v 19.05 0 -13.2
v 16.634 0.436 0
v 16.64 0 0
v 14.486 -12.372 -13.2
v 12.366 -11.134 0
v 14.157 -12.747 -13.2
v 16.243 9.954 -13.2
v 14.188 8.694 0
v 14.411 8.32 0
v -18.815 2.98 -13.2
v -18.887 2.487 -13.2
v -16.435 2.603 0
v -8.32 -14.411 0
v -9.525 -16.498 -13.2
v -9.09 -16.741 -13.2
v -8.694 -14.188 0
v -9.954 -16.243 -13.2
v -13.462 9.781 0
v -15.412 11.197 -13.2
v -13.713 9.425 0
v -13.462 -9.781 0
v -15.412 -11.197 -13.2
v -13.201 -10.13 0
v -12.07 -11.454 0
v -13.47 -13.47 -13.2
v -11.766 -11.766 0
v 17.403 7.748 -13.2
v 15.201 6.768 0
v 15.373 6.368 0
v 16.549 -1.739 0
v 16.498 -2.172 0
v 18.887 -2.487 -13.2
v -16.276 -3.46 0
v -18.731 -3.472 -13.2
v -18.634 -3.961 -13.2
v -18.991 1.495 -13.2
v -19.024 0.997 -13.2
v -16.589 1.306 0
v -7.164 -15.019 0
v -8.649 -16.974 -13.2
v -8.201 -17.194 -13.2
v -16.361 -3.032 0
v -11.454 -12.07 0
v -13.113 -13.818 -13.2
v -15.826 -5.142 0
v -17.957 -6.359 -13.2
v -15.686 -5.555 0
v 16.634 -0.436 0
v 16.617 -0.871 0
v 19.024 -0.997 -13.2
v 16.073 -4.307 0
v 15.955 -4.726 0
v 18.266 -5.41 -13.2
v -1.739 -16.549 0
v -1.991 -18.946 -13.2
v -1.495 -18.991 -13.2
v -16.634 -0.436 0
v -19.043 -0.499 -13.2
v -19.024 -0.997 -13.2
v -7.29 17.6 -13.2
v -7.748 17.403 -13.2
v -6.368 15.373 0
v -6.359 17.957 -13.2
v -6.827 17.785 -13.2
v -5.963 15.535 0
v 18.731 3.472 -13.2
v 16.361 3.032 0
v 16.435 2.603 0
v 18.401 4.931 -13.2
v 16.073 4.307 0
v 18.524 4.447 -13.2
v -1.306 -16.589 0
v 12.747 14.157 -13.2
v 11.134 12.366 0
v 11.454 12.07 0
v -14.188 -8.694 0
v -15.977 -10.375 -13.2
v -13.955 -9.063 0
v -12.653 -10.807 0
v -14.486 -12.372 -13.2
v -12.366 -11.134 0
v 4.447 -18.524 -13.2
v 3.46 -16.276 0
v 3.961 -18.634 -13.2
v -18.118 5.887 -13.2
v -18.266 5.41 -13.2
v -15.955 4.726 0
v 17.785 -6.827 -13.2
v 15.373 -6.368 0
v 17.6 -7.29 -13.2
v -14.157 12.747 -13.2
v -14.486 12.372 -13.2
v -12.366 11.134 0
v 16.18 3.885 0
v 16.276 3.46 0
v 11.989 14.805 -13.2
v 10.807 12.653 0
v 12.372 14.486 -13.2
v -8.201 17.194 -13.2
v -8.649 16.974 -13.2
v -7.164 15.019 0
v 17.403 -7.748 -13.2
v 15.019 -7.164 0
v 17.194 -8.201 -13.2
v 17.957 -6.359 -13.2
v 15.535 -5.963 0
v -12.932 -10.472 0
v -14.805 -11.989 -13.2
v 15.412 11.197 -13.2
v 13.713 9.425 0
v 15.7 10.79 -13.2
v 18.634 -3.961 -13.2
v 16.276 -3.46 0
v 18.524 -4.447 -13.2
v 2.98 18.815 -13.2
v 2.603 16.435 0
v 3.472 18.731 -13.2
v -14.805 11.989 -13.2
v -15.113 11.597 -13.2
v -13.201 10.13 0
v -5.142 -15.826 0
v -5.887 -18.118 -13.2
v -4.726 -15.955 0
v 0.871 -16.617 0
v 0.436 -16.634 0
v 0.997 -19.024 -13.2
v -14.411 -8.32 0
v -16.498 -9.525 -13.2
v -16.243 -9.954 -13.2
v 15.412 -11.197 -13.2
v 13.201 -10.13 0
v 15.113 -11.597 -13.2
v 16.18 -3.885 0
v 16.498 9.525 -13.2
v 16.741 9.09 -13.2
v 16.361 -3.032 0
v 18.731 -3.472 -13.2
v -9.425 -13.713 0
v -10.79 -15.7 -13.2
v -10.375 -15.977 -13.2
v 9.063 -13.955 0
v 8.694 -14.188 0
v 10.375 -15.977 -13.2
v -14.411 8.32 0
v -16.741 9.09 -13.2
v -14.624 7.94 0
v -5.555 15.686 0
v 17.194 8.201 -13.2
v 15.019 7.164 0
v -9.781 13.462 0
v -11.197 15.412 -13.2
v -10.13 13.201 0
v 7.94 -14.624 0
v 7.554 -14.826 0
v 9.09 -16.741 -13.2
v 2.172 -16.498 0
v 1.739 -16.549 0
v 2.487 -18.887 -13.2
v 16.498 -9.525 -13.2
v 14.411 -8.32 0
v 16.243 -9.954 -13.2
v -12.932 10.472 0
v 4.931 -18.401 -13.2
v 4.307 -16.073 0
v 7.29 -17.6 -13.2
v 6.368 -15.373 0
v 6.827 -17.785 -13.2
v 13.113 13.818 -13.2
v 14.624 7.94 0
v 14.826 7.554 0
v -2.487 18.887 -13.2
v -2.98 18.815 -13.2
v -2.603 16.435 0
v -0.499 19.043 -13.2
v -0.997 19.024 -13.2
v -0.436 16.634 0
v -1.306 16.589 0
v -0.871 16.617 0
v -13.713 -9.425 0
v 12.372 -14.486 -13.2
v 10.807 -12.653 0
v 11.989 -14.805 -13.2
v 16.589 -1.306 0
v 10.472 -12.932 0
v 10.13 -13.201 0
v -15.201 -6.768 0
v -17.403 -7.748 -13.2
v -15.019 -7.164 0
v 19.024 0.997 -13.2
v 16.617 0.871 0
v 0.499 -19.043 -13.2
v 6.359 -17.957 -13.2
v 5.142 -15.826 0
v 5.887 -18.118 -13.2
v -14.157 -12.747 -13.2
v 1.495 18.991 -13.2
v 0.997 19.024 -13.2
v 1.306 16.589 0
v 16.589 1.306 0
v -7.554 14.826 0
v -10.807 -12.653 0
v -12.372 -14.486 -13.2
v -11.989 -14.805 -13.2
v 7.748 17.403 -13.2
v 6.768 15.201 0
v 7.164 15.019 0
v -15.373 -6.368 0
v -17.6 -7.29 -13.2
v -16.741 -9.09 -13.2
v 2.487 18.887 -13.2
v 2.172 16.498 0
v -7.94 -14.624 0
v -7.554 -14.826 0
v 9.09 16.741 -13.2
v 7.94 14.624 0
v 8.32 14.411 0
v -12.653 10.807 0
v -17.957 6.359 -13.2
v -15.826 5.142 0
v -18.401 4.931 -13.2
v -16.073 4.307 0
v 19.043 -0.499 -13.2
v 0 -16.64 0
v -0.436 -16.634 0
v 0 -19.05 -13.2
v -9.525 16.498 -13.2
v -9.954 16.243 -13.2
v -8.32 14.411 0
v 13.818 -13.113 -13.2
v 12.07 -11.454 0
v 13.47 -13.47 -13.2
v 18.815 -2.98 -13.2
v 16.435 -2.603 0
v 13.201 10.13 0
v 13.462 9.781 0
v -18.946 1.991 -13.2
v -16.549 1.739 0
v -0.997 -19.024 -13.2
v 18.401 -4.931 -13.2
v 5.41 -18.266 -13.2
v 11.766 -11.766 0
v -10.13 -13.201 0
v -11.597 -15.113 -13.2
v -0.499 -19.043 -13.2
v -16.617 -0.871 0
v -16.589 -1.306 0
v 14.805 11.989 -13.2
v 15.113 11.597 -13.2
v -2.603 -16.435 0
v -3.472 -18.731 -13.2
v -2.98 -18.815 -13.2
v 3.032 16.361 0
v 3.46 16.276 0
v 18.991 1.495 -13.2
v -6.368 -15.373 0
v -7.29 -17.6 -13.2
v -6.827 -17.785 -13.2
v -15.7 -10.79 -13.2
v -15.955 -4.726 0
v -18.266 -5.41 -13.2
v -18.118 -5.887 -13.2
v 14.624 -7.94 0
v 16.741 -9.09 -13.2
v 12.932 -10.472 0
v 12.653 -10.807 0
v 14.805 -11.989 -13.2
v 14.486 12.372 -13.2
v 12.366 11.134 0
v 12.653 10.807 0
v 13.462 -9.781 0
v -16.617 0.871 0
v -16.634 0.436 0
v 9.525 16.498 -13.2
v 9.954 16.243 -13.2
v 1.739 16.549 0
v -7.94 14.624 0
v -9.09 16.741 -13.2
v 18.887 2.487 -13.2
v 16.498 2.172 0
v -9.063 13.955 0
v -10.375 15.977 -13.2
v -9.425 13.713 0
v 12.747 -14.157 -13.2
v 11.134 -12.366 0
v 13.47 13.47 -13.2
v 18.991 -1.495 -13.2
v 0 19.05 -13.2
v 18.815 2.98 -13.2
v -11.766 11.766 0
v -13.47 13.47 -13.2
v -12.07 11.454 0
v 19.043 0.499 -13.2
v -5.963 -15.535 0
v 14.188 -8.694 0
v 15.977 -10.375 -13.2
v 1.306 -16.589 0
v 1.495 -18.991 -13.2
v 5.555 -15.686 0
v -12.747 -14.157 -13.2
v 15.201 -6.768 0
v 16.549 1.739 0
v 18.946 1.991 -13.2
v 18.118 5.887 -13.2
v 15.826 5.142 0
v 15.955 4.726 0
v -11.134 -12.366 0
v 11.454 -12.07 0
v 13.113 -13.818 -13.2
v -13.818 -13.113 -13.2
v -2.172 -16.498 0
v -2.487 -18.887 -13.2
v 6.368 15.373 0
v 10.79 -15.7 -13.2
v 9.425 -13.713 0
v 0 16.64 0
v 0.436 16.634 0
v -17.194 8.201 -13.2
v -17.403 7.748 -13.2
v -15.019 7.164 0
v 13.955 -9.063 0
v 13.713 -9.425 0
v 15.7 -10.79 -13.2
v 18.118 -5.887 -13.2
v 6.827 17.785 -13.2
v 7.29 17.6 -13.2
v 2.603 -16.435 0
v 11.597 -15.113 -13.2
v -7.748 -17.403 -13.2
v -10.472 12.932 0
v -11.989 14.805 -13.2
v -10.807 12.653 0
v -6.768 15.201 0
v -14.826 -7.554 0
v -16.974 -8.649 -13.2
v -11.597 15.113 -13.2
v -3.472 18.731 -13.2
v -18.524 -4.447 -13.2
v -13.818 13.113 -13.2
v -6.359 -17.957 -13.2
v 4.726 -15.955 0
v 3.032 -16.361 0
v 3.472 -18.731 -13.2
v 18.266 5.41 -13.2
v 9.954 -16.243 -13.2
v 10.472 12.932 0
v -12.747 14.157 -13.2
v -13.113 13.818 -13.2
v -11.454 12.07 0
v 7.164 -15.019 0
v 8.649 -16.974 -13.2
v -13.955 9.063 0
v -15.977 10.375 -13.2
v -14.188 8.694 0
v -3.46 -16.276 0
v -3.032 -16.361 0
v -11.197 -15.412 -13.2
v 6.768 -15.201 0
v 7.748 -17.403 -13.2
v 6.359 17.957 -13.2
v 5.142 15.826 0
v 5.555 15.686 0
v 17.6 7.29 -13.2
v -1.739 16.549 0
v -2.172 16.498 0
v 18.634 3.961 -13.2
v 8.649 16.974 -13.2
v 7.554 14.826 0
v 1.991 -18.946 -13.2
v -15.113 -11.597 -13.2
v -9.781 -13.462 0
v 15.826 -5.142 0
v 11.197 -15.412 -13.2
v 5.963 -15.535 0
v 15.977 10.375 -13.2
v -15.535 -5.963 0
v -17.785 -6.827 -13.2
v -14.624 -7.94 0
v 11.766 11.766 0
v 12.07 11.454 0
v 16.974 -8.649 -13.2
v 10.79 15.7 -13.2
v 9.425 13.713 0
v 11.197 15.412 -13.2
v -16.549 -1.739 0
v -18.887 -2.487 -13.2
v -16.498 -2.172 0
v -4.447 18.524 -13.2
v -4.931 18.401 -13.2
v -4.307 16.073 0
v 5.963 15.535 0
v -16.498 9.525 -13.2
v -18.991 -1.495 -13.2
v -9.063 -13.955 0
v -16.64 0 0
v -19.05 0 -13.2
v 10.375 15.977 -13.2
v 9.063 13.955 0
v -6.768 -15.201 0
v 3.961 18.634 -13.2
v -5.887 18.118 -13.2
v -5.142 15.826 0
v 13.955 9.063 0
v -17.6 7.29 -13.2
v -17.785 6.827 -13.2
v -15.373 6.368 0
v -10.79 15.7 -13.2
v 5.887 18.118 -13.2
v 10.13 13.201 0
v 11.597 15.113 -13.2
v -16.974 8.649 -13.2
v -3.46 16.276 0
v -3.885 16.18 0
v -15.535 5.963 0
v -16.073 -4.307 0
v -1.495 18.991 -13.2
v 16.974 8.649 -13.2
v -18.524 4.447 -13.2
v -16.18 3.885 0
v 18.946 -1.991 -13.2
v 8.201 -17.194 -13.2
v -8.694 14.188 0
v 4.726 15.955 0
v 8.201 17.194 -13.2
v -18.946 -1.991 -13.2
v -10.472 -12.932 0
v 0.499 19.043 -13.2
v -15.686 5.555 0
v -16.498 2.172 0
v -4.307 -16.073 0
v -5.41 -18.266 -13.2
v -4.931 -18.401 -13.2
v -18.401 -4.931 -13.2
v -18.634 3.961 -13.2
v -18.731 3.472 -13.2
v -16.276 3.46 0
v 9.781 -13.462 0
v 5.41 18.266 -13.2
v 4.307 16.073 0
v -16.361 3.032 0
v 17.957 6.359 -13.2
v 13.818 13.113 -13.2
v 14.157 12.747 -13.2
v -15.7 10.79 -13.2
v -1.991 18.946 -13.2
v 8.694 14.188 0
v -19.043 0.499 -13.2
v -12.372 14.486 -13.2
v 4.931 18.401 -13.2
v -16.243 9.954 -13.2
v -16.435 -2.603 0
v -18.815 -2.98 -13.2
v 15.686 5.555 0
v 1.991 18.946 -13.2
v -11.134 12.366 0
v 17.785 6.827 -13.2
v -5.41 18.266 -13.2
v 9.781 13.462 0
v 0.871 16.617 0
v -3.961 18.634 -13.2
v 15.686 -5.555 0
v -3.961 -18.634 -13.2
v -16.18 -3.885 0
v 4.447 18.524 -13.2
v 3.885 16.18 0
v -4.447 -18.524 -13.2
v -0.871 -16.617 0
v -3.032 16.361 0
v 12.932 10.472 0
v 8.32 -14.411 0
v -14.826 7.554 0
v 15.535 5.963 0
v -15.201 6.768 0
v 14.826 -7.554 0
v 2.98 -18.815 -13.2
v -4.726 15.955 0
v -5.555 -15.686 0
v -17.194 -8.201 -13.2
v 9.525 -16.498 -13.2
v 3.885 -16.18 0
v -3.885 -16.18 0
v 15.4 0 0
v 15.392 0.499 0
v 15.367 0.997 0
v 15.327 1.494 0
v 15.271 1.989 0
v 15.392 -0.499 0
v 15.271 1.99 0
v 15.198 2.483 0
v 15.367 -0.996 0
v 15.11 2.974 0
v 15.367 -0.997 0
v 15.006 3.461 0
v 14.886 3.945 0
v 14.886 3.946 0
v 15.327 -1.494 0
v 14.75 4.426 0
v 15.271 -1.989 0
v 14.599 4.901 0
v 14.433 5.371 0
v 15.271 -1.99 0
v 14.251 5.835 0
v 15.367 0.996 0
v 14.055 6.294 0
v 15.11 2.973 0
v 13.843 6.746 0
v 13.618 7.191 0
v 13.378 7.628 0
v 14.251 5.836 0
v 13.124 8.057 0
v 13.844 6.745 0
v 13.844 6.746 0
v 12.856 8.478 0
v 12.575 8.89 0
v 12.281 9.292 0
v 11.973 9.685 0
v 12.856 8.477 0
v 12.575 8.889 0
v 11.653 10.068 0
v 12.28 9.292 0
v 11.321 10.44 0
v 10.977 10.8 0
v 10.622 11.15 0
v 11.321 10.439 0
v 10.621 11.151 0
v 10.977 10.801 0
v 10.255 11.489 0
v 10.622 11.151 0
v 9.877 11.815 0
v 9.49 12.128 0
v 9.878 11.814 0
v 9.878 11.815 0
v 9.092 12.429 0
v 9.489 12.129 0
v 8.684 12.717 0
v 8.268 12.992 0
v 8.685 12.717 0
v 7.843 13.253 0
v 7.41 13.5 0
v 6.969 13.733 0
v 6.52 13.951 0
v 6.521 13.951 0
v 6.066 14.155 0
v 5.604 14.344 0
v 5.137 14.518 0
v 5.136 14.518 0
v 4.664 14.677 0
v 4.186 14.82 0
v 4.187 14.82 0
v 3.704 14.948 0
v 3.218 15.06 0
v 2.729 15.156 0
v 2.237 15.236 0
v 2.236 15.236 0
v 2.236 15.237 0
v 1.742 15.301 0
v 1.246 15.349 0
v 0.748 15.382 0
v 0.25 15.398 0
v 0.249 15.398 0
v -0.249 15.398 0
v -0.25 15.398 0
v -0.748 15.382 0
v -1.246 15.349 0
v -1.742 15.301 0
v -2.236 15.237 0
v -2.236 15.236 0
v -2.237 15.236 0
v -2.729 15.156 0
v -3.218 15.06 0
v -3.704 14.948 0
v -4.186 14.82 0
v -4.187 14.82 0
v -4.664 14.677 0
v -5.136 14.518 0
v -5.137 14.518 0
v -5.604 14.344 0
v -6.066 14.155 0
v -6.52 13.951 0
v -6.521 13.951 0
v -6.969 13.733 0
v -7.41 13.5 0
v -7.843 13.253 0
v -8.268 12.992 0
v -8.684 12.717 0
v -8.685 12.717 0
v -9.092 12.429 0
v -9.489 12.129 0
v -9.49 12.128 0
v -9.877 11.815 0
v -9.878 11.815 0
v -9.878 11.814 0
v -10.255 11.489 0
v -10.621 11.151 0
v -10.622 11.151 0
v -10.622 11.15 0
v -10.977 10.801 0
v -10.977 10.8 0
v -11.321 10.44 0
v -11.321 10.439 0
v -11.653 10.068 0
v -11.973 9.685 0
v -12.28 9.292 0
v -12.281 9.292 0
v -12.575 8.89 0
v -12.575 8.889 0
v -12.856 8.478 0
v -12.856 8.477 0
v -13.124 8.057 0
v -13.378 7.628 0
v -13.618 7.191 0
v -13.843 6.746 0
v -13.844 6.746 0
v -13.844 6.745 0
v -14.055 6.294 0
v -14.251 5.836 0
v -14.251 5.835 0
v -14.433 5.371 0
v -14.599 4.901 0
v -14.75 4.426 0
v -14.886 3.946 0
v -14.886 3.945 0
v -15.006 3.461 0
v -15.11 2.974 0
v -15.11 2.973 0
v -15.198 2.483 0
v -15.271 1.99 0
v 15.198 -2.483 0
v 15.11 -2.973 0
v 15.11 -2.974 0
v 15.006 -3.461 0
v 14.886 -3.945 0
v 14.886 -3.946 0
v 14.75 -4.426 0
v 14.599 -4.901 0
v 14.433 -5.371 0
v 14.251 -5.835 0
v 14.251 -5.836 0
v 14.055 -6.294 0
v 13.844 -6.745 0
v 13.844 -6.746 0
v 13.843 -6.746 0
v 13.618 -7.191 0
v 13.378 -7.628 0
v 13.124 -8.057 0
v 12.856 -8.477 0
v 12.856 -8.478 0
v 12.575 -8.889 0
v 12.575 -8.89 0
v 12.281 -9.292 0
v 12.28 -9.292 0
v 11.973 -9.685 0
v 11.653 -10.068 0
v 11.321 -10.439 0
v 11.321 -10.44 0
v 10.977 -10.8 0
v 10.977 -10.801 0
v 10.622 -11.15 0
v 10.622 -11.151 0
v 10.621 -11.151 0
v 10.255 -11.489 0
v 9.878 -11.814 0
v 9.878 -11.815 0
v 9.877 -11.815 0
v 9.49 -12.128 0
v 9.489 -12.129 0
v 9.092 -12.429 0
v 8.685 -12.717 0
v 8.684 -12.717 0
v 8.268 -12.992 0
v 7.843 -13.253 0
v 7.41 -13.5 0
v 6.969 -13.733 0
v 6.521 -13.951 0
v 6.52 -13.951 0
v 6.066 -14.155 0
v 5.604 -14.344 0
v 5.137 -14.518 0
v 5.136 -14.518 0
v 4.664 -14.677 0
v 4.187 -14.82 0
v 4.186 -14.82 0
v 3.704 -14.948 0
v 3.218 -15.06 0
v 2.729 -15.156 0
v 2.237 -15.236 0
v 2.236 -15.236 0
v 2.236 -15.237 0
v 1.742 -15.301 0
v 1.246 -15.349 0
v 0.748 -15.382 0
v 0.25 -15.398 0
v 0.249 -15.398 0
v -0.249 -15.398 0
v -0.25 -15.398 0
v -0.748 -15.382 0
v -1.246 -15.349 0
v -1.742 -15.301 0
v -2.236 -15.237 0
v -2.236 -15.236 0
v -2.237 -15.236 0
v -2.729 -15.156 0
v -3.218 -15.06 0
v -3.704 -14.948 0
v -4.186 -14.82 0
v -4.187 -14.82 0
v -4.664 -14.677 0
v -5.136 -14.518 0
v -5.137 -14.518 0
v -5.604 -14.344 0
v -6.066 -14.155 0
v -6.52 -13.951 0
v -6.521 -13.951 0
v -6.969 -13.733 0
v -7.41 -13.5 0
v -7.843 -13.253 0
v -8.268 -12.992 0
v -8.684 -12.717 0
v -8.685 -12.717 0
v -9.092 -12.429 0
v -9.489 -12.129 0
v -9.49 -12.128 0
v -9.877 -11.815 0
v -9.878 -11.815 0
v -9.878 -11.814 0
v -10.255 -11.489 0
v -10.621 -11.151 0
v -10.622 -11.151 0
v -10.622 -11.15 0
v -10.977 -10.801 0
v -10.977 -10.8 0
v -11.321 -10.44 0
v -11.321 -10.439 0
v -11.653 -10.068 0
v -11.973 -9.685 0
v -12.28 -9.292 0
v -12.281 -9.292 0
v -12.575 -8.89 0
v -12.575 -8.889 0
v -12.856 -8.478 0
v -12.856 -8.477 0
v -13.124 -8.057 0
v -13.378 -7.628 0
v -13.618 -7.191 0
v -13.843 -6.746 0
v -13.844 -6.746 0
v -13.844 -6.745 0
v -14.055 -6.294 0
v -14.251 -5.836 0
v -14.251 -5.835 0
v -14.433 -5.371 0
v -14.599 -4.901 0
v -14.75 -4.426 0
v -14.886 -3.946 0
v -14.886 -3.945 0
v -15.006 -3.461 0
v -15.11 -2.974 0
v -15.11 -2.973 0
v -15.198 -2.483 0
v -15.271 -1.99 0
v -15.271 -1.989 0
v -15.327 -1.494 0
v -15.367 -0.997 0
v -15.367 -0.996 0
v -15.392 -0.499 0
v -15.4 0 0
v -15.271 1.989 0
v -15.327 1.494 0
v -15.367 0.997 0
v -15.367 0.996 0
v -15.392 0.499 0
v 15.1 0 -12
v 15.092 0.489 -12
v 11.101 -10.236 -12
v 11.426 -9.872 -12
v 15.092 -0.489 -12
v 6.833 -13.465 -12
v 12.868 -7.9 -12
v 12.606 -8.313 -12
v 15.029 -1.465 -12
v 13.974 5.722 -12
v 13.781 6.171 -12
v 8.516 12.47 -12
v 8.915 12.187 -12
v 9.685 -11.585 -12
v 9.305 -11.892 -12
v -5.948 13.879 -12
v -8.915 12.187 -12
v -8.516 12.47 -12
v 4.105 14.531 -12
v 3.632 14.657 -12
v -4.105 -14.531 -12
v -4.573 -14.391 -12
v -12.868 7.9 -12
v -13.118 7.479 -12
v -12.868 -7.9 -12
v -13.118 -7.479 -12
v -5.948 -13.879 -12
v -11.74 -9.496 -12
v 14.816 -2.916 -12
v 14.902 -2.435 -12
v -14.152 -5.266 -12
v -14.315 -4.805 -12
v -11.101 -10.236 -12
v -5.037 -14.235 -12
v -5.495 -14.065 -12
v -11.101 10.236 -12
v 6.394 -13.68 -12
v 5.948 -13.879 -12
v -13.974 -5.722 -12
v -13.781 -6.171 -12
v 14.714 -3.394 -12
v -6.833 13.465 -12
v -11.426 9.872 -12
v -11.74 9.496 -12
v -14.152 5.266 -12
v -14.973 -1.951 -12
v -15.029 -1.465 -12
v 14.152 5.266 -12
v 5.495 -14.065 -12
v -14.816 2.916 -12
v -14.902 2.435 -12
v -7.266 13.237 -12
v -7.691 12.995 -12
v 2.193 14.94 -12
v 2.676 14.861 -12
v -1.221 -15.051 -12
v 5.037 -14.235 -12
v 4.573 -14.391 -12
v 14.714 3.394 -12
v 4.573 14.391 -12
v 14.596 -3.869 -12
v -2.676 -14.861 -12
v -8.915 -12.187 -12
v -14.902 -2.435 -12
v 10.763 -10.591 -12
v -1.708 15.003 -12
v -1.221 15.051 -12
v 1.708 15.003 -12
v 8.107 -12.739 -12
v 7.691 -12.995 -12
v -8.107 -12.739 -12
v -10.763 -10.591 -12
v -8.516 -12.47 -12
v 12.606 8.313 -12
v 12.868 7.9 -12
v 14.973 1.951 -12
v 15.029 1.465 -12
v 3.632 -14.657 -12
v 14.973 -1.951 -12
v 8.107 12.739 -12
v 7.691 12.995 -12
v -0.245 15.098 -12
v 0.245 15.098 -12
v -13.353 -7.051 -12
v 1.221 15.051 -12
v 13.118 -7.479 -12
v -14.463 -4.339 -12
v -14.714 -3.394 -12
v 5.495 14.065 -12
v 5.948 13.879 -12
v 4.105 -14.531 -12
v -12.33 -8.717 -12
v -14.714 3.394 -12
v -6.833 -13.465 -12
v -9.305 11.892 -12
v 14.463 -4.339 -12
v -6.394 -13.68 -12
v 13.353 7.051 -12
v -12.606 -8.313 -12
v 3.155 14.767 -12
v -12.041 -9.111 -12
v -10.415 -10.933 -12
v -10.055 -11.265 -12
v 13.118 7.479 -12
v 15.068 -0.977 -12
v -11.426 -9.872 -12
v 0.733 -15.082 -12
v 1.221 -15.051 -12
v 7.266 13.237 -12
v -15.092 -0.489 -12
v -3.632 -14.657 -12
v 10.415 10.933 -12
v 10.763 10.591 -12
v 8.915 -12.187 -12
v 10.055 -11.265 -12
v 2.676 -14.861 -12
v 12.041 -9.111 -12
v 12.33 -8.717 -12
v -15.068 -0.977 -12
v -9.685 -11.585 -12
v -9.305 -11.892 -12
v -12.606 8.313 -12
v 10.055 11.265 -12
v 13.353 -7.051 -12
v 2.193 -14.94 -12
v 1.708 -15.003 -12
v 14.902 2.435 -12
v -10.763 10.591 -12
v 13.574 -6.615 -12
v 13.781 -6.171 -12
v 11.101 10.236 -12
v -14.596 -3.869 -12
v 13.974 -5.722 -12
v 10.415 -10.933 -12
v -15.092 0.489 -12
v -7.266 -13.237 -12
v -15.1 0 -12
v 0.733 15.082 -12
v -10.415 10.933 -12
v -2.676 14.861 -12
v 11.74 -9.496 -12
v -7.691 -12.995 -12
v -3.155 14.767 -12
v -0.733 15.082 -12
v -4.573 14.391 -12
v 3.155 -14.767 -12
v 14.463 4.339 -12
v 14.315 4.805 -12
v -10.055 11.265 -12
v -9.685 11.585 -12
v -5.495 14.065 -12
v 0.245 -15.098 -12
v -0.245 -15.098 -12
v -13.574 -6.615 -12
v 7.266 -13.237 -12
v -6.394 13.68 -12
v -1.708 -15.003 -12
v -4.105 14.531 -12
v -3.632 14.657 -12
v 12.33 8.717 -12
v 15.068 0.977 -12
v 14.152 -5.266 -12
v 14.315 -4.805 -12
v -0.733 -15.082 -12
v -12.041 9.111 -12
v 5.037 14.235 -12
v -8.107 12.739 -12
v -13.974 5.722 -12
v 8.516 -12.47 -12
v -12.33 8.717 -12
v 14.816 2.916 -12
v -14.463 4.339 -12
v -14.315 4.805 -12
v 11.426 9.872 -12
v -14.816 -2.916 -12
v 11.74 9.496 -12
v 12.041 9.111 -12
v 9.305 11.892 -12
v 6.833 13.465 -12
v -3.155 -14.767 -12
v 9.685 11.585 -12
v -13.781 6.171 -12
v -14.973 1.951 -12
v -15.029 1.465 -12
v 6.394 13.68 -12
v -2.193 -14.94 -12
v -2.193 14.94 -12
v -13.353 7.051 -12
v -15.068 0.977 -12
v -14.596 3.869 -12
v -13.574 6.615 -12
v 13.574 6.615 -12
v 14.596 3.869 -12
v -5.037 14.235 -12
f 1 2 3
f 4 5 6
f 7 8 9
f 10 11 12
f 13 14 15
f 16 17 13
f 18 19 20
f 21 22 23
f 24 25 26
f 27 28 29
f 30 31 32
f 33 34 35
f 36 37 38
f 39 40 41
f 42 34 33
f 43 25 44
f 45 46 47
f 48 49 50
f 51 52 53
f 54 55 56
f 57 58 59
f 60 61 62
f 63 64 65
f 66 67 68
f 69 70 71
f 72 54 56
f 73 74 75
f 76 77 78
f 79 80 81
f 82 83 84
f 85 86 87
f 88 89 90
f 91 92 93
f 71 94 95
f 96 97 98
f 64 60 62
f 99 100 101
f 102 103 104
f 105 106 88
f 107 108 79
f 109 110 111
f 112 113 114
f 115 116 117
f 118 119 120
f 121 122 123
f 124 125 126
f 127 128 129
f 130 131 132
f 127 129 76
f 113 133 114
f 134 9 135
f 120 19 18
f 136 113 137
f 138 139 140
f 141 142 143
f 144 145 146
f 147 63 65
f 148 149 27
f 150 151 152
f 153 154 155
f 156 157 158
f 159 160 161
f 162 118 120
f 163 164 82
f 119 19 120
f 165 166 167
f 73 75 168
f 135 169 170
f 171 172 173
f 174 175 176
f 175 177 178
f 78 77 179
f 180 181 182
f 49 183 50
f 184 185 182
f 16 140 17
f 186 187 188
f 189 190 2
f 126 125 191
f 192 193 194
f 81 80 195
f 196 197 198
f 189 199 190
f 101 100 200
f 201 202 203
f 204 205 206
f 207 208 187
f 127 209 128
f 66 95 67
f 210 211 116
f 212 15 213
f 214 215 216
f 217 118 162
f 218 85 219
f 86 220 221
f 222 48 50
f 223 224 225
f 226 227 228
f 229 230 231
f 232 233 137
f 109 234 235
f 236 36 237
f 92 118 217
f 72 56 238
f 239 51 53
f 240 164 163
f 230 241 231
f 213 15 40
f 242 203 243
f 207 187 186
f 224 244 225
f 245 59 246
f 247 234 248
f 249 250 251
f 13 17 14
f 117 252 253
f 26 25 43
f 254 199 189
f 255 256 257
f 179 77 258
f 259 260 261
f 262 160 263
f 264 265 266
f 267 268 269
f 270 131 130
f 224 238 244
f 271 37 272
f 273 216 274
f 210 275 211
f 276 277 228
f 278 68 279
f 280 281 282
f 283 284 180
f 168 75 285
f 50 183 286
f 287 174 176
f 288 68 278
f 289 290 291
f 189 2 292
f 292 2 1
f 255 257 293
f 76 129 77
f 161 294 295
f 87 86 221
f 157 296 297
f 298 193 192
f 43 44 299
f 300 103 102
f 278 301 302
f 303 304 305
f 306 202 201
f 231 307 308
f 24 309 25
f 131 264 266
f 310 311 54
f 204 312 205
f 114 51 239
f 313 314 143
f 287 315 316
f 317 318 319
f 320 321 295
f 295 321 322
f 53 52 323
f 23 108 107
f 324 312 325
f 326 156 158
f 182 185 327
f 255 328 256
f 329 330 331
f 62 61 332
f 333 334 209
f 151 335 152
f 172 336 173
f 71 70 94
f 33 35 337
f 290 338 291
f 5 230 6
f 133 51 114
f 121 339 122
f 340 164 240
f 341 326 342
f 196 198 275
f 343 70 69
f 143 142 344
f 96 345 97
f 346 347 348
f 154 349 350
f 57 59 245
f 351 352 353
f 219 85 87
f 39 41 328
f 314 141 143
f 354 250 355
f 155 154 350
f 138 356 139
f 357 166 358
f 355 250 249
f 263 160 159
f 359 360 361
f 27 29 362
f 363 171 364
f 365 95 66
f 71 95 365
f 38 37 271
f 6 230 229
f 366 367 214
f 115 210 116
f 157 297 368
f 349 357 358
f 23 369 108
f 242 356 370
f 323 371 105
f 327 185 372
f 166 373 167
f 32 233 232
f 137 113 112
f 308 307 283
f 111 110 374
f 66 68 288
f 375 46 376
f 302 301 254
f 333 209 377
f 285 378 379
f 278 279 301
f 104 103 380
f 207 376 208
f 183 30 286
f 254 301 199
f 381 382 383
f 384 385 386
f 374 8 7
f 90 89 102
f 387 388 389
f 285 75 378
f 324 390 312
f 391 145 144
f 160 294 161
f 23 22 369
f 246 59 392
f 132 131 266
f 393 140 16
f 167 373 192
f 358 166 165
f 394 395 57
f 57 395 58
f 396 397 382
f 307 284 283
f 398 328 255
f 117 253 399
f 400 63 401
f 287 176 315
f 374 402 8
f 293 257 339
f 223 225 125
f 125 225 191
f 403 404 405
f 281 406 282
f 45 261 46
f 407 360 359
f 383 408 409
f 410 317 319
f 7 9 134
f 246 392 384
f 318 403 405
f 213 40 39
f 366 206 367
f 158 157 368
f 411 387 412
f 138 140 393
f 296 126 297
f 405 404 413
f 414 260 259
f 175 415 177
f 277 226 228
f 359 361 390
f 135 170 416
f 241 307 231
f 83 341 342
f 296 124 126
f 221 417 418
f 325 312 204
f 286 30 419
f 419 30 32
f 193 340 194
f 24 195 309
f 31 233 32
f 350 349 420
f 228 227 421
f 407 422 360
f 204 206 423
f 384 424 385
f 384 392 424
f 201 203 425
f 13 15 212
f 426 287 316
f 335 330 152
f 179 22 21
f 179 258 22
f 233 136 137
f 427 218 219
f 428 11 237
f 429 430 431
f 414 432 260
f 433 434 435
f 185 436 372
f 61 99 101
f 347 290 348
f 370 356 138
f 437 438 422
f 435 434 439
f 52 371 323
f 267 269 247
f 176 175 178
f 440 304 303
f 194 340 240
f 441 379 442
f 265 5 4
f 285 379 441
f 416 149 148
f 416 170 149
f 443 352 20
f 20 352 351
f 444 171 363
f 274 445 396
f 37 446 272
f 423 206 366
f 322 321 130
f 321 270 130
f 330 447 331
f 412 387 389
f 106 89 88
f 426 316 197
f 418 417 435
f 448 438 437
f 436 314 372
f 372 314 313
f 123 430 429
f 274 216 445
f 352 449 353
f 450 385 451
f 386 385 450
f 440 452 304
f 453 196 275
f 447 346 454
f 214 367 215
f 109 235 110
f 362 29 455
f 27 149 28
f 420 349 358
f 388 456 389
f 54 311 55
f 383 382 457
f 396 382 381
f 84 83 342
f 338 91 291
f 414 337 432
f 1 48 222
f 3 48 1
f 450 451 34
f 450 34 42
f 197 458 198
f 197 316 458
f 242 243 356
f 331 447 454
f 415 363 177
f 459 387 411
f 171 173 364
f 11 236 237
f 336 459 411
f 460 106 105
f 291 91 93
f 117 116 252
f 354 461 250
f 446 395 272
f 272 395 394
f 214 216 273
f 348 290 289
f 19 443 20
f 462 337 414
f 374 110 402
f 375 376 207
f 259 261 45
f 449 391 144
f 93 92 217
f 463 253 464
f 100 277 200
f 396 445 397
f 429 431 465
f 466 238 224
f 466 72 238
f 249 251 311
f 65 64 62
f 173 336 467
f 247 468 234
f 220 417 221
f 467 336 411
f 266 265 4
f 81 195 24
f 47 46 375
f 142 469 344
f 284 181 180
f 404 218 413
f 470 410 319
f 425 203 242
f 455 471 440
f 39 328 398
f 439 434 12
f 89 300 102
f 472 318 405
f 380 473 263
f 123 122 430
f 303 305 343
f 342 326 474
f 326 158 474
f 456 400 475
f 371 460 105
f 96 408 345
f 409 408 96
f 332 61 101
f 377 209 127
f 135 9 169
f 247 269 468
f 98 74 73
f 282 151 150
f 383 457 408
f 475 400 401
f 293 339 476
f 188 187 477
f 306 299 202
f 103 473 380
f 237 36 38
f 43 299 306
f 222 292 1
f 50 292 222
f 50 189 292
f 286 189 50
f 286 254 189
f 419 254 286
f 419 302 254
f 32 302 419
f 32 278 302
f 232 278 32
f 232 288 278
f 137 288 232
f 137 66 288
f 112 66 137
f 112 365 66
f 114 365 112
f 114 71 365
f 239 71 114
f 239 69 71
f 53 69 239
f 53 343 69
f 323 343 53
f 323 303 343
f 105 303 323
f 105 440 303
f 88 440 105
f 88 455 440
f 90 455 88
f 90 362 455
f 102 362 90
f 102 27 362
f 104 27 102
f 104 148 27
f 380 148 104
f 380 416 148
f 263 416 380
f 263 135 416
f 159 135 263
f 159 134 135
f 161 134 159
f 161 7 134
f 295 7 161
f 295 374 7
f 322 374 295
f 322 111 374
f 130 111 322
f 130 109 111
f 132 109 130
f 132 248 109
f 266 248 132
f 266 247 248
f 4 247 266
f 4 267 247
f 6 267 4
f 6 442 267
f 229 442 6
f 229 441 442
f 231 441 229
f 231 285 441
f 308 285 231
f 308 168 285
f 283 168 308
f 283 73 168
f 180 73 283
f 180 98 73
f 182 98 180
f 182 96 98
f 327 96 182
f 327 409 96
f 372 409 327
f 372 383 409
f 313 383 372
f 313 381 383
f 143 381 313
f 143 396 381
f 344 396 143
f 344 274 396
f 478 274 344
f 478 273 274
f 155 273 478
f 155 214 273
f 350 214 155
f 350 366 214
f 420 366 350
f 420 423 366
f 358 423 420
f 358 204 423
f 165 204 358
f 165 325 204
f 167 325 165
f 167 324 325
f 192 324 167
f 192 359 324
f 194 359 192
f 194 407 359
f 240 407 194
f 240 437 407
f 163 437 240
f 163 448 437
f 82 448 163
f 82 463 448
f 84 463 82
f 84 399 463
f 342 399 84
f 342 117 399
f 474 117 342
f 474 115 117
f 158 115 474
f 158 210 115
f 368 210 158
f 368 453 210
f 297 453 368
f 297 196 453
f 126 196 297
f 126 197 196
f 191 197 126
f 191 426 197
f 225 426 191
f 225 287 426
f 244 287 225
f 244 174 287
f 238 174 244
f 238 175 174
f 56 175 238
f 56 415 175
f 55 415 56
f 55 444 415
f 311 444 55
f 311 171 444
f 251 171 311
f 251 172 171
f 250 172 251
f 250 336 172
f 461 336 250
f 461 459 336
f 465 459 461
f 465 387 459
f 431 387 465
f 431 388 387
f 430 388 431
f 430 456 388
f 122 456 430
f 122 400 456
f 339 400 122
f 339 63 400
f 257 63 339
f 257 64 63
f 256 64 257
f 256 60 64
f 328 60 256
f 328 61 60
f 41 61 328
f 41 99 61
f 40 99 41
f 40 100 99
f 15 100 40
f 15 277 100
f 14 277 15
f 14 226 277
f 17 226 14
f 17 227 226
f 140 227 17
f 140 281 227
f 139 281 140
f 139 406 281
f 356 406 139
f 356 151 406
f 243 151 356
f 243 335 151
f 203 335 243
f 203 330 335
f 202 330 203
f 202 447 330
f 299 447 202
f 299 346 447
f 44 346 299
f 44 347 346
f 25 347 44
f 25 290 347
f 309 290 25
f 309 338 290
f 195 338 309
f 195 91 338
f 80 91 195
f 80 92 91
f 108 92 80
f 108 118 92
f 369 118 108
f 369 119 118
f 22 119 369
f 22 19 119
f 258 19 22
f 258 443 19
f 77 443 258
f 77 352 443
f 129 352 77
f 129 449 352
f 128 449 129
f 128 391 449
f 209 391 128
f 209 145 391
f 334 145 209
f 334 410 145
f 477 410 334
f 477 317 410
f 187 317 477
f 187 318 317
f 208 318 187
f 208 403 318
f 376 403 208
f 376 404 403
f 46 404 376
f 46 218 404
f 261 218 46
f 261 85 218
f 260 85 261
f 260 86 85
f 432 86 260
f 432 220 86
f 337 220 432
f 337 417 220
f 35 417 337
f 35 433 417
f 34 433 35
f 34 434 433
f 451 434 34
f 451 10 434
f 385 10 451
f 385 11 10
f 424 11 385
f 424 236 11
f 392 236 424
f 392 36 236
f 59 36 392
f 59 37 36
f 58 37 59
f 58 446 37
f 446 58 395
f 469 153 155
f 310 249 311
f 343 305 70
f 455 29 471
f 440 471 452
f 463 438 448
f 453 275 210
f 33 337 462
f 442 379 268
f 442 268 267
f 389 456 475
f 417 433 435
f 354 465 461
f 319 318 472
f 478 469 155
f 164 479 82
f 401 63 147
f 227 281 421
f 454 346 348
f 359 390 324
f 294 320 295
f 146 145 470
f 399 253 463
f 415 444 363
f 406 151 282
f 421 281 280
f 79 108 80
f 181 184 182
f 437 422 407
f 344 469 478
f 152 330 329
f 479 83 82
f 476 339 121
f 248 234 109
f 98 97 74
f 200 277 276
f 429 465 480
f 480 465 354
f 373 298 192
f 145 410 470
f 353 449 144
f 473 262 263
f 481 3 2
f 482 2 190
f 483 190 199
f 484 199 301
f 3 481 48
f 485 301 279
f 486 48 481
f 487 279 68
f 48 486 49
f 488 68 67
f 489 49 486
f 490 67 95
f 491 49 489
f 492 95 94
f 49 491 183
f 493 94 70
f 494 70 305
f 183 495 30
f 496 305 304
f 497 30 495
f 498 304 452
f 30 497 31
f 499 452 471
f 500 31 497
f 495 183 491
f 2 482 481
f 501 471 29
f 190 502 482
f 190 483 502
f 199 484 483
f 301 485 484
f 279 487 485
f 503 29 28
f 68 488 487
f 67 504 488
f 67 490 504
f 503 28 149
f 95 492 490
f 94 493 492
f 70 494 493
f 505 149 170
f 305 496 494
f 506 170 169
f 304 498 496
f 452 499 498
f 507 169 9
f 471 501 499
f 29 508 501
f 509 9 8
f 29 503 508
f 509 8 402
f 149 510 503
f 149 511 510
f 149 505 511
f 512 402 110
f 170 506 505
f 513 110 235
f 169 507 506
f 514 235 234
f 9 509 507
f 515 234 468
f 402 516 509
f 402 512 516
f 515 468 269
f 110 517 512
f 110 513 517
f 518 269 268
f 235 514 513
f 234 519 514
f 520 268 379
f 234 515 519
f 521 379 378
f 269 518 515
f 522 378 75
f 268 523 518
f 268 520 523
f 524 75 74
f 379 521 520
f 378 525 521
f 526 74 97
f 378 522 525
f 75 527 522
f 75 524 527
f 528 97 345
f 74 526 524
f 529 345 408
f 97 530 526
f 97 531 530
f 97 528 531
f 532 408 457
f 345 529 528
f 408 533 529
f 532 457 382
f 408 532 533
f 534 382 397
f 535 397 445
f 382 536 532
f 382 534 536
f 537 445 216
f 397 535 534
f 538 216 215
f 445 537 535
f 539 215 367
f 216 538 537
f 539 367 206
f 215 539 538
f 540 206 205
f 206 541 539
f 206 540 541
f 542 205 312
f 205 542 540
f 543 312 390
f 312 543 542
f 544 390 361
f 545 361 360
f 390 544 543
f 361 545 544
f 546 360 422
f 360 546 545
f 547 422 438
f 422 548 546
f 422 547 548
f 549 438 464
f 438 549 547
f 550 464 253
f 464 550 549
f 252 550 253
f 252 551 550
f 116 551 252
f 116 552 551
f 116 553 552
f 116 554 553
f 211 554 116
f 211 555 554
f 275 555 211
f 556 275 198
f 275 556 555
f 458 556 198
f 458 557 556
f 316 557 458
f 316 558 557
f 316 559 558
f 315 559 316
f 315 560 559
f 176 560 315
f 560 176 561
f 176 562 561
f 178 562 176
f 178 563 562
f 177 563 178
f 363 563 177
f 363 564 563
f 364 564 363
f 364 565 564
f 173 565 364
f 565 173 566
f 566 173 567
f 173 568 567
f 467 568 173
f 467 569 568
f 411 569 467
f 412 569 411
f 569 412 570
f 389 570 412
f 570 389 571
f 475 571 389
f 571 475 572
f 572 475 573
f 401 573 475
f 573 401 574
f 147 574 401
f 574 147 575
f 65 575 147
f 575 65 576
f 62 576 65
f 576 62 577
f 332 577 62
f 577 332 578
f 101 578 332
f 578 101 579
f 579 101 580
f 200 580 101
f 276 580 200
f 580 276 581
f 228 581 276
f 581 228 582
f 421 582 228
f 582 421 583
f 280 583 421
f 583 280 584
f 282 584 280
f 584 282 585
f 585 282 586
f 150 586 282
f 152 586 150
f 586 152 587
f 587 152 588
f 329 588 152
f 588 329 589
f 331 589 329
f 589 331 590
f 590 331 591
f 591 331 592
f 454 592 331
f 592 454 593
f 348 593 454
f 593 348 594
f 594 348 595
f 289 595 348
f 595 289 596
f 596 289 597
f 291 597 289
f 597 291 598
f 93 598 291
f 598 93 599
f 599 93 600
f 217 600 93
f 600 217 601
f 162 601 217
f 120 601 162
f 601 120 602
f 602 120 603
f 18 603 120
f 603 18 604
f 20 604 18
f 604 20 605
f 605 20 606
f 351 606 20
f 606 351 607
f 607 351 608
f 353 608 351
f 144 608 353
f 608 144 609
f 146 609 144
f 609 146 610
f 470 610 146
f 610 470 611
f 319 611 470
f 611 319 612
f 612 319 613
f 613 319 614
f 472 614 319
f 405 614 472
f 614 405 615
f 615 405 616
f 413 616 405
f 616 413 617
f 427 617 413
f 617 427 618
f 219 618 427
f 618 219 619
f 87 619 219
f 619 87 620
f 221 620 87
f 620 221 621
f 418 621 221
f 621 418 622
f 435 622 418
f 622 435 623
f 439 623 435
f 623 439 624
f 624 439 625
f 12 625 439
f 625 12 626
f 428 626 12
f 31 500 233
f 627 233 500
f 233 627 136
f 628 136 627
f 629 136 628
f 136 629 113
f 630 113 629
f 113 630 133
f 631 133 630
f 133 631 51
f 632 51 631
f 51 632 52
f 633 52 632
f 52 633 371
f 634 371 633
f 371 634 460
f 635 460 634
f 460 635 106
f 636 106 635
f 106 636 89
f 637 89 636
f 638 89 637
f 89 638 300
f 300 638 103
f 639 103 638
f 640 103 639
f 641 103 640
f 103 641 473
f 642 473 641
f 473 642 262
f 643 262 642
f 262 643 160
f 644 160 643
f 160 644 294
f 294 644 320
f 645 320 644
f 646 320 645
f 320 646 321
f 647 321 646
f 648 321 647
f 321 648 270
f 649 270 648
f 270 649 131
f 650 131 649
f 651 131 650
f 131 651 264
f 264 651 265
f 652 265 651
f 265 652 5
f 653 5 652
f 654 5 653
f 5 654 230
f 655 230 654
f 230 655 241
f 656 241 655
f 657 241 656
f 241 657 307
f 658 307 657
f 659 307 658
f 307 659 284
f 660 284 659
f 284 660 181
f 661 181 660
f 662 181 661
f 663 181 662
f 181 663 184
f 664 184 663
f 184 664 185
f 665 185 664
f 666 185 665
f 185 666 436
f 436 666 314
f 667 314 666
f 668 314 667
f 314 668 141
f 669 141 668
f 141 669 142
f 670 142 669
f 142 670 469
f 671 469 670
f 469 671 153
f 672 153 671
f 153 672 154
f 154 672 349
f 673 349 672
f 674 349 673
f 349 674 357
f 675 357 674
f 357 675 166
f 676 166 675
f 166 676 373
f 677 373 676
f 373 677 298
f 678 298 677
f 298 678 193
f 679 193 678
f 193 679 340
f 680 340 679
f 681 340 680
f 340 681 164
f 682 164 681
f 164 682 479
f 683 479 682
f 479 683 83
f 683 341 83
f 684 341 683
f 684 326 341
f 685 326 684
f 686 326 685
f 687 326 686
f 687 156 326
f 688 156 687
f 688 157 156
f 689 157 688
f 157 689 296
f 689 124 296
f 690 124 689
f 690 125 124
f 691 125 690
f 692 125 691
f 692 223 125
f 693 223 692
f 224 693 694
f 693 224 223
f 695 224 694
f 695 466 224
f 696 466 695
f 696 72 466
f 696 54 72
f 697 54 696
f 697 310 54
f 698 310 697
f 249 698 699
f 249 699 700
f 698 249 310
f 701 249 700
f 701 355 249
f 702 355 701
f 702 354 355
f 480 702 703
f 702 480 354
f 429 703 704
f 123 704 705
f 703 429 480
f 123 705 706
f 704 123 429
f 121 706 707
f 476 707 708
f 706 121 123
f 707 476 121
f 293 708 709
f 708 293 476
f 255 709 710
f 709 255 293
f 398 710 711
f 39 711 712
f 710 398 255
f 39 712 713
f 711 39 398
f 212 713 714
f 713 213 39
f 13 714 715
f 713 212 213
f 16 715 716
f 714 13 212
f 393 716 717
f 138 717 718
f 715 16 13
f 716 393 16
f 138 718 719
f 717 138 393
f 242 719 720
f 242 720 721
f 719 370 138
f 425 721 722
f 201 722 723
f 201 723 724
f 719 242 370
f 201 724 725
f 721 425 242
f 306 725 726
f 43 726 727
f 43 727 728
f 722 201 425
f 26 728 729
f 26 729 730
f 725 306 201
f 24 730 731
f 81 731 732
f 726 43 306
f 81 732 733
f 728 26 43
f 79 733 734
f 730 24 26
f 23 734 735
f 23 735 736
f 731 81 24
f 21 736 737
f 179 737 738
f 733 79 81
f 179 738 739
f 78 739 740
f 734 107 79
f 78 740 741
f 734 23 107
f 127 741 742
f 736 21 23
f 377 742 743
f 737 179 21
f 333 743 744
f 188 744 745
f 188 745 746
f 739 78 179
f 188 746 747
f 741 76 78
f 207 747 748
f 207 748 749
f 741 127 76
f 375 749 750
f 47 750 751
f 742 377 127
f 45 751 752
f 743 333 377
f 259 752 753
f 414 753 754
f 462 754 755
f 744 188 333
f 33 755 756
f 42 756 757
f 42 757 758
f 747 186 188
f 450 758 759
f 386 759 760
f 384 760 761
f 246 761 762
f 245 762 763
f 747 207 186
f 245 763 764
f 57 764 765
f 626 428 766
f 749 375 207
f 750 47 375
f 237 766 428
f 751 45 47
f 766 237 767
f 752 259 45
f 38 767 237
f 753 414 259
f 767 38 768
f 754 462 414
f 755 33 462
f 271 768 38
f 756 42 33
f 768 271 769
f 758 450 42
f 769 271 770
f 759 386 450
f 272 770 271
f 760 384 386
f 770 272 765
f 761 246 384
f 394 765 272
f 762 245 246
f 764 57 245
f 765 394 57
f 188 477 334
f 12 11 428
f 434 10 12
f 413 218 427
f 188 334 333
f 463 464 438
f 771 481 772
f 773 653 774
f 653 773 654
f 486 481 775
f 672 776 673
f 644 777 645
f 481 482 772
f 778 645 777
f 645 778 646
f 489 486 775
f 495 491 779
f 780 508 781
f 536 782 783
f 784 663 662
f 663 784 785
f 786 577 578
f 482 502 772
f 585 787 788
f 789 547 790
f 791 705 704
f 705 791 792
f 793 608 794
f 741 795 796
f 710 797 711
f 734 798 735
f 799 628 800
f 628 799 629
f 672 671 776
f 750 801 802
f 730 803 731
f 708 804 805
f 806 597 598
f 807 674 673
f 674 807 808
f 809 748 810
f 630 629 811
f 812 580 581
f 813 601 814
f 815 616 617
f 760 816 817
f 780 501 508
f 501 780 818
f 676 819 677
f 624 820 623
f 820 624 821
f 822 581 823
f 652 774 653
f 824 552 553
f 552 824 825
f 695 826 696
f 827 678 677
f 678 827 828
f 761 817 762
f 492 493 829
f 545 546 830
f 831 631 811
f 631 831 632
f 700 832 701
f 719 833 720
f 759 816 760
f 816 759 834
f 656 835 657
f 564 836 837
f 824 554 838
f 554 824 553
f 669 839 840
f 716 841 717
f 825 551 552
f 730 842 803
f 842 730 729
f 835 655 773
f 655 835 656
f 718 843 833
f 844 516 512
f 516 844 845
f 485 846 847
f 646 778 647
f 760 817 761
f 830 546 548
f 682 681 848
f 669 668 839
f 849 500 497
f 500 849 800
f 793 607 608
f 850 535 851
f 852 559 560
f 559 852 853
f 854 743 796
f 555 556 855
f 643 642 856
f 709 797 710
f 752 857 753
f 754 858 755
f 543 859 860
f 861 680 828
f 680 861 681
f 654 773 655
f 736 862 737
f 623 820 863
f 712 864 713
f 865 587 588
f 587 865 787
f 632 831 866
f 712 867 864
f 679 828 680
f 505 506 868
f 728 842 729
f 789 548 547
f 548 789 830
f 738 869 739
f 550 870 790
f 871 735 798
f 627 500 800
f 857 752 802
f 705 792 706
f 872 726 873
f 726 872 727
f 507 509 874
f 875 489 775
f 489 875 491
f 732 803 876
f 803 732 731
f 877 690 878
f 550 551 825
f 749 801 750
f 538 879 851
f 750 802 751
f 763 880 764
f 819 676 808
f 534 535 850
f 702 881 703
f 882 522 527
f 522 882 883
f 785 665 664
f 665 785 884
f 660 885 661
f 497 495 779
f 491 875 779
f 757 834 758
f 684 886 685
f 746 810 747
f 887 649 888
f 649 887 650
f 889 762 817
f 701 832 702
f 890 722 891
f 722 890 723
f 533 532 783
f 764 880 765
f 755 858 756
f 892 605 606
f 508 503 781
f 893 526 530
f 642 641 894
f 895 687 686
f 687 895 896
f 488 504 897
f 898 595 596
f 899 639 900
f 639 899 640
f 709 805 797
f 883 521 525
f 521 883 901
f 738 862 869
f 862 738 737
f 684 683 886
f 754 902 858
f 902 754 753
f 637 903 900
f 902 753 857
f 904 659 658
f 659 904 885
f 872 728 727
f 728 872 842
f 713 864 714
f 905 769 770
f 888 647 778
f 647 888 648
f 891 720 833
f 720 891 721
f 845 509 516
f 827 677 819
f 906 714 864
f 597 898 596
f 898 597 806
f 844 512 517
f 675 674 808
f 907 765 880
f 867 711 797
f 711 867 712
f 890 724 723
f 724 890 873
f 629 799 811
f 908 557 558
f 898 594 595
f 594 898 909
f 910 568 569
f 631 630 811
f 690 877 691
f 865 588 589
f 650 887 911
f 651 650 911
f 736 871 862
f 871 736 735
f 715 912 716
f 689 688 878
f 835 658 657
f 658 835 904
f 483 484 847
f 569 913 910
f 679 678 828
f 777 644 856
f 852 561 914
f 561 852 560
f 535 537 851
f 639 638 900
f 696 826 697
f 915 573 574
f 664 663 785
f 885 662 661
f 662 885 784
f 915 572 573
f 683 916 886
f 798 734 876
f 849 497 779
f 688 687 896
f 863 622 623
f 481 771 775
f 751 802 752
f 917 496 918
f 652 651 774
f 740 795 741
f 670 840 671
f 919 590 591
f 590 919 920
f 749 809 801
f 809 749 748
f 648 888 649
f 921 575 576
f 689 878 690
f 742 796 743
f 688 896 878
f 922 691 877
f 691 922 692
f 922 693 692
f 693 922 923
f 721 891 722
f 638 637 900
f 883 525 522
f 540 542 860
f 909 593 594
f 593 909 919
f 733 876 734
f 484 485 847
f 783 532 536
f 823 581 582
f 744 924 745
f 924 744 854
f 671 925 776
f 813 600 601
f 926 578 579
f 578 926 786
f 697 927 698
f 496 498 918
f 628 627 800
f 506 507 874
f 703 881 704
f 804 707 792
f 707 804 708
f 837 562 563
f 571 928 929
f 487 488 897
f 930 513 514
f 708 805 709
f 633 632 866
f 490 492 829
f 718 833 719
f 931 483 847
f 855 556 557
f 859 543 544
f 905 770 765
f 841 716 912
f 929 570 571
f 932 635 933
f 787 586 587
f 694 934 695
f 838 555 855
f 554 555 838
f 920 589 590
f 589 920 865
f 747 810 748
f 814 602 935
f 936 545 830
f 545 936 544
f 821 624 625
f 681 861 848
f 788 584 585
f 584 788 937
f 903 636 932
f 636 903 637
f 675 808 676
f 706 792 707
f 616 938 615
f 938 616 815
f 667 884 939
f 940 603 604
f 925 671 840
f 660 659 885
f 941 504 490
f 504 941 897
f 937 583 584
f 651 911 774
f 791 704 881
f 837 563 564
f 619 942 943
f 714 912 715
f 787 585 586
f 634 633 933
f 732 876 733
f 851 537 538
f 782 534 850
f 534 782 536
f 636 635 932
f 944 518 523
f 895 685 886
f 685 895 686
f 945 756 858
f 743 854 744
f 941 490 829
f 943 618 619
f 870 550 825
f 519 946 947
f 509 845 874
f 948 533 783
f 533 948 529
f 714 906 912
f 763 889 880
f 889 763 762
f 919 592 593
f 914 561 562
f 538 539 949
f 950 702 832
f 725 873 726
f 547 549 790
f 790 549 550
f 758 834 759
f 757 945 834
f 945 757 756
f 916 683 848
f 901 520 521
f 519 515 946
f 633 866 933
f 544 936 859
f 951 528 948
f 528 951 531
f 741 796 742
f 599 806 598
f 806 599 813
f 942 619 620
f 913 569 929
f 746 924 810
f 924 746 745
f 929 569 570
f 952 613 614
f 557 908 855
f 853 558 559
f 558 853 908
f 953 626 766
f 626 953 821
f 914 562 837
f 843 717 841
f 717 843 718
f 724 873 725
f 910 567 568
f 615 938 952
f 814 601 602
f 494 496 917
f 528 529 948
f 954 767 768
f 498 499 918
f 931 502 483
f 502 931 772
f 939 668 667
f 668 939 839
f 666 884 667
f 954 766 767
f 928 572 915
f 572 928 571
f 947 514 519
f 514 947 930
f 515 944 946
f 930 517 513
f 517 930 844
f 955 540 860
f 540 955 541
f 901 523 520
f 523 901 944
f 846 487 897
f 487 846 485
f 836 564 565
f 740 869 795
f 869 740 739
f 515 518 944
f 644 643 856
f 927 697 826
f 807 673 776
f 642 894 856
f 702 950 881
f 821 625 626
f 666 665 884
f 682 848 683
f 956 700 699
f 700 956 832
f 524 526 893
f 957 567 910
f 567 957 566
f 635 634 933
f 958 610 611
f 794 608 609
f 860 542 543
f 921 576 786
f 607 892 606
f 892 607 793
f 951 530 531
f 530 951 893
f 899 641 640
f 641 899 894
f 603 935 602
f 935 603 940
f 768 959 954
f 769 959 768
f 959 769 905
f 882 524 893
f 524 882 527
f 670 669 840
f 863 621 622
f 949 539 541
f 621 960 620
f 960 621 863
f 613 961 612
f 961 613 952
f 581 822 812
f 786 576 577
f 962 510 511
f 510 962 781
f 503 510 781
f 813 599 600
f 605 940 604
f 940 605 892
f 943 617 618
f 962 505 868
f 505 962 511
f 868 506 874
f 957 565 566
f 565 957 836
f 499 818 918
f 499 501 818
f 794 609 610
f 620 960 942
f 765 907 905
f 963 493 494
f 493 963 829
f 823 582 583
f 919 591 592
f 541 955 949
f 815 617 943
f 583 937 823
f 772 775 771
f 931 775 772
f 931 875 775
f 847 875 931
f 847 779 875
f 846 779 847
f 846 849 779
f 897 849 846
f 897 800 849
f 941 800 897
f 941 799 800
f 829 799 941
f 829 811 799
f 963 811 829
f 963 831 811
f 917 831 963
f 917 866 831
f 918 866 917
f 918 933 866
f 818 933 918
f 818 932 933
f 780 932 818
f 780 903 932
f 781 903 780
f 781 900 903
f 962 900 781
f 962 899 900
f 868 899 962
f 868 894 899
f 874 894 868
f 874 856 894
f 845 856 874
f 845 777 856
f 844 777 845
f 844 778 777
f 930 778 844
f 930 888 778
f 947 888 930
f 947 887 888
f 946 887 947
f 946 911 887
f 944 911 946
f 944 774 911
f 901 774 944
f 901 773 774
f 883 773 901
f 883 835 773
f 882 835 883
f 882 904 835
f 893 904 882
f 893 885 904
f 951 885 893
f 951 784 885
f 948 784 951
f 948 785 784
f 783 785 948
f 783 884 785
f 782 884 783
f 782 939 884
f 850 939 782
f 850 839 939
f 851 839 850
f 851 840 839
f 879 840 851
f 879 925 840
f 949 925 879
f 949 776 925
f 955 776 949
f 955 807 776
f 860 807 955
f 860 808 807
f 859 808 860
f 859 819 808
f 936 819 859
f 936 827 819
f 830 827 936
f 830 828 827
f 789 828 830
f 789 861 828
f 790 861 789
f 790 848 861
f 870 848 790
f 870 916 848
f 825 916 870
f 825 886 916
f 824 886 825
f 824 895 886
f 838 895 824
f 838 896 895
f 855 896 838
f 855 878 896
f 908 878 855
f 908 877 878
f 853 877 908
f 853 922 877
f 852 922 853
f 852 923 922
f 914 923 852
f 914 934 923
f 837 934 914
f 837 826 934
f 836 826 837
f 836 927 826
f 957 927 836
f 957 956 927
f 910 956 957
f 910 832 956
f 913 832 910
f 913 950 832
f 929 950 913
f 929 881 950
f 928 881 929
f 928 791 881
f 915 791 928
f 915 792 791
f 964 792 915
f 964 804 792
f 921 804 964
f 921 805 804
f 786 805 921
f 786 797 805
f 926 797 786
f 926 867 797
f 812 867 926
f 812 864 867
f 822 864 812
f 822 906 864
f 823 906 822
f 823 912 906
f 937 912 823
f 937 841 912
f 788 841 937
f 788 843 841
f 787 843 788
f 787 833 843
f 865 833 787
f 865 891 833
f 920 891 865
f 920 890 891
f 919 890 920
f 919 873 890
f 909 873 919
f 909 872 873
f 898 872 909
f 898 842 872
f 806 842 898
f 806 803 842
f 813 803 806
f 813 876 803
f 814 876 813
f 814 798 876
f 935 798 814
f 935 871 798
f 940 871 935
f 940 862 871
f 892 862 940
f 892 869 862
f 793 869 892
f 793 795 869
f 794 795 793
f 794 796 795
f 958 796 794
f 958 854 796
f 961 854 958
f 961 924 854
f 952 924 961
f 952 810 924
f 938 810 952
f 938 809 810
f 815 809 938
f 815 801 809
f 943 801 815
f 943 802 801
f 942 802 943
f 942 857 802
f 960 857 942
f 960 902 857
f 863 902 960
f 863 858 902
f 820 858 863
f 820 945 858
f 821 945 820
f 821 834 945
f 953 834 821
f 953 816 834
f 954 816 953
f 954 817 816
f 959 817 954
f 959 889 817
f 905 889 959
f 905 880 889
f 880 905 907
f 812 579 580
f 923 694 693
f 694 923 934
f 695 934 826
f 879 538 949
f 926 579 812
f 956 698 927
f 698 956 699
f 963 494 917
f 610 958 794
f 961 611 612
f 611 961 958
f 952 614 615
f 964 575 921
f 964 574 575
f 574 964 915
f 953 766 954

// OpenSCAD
$fa = .01;
$fs =.5;
ep=.01;
h=12;
d2=30.0+.2;
d1=30.6+.2;
twt=1.24;
inch=25.4;
difference(){
    mirror([0,0,1]) cylinder(h=h+1.2,d1=d1+twt*2,d2=inch*1.5);
    translate([0,0,ep]) mirror([0,0,1]) cylinder(h=h+ep,d1=d1,d2=d2);
}
